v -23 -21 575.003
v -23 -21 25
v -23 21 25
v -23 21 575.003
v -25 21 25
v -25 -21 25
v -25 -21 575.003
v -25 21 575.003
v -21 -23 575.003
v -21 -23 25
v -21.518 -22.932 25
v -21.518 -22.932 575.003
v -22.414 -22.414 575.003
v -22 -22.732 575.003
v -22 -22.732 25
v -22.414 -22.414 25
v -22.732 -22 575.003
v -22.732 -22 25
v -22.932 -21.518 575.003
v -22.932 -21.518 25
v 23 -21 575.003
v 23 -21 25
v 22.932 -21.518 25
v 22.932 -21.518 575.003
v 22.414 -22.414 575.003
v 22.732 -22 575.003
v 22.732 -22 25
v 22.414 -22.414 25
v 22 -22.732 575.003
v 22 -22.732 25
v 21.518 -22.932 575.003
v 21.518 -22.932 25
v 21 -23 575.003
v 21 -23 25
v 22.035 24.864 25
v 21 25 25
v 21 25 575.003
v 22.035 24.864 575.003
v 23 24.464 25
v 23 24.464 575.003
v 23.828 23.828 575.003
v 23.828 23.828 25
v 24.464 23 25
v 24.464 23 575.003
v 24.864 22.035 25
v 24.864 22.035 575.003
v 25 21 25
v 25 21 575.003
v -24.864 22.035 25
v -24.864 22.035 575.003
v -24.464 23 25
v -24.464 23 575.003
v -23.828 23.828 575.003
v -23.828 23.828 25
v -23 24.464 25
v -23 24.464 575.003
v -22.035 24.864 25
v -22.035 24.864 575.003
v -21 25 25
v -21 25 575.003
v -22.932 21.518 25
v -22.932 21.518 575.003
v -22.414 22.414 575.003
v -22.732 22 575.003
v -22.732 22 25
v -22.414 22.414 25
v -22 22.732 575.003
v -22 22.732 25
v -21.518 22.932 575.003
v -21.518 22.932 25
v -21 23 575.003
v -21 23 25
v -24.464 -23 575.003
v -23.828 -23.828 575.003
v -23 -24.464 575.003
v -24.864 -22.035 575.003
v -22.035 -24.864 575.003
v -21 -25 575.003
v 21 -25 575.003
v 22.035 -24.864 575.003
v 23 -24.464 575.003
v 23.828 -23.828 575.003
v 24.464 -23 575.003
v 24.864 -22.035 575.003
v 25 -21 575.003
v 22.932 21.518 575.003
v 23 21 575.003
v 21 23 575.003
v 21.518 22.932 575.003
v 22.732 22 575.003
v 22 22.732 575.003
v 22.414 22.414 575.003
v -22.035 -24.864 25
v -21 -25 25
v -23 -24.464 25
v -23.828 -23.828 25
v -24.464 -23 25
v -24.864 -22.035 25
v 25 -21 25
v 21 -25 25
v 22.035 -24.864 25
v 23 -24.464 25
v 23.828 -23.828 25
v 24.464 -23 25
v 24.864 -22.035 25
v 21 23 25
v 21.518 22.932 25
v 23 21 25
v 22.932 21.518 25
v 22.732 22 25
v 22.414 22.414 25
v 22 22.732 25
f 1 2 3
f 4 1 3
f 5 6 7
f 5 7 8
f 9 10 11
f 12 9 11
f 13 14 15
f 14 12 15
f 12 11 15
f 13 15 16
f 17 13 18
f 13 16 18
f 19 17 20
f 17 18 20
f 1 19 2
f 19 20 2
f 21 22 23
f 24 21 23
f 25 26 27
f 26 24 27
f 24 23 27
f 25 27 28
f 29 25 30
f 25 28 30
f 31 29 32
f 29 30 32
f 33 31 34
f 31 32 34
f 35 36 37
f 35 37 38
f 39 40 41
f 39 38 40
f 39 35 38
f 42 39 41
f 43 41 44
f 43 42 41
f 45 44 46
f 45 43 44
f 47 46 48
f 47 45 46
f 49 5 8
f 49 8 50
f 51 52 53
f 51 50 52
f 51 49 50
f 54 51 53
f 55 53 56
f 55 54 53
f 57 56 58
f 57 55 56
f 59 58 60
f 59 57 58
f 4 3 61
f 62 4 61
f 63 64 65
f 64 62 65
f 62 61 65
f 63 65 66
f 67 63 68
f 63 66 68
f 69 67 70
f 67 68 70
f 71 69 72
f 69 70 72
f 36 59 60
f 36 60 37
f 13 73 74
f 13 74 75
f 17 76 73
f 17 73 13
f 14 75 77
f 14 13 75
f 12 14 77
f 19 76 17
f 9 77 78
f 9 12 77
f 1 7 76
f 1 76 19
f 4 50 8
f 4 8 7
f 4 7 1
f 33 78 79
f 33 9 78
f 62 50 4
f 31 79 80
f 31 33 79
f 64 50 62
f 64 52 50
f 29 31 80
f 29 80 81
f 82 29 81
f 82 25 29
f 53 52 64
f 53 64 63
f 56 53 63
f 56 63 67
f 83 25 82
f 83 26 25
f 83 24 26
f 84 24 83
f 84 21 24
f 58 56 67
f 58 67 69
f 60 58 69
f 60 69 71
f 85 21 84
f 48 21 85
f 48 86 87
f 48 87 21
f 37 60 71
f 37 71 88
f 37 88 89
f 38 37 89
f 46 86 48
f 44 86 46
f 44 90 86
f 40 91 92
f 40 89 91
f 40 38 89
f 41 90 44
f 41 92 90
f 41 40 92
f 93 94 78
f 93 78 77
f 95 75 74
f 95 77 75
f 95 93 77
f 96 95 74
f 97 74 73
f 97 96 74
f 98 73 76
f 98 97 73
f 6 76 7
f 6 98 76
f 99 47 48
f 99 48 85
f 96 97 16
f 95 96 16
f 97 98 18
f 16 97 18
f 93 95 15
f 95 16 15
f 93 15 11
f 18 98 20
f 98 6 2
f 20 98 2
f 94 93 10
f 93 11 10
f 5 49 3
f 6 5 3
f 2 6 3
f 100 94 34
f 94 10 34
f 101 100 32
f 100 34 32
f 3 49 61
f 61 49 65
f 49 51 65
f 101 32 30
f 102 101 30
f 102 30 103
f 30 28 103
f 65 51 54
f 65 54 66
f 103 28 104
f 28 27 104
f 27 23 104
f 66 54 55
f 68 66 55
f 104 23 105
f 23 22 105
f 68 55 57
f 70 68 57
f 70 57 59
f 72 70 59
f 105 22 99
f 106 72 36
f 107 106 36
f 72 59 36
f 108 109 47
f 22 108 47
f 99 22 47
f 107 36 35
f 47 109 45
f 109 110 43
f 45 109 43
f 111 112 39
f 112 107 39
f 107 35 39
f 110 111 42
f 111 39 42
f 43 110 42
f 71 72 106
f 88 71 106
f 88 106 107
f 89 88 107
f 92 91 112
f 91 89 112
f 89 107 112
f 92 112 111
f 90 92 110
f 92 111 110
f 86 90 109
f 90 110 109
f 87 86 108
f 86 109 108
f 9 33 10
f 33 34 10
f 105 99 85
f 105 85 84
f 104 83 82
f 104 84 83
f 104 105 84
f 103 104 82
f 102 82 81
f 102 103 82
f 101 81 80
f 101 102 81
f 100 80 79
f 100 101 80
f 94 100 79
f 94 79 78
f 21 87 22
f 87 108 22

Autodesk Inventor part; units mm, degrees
ref_plane "Start Plane" through (0, 0, 25) normal (0, 0, 1) x (1, 0, 0)
ref_plane "End Plane" through (0, 0, 575.0026) normal (0, 0, 1) x (1, 0, 0)
sketch "Sketch" plane through (0, 0, 0) normal (0, 0, 1) x (1, 0, 0)
  line L0 (-25, -21) -> (-25, 21)
  line L1 (-21, 25) -> (21, 25)
  line L2 (25, 21) -> (25, -21)
  line L3 (21, -25) -> (-21, -25)
  arc A0 (-25, -21) -> (-21, -25) centre (-21, -21) ccw
  arc A1 (25, 21) -> (21, 25) centre (21, 21) ccw
  arc A2 (-21, 25) -> (-25, 21) centre (-21, 21) ccw
  arc A3 (21, -25) -> (25, -21) centre (21, -21) ccw
  arc A4 (-21, 23) -> (-23, 21) centre (-21, 21) ccw
  line L4 (-21, 23) -> (21, 23)
  arc A5 (23, 21) -> (21, 23) centre (21, 21) ccw
  line L5 (23, 21) -> (23, -21)
  arc A6 (21, -23) -> (23, -21) centre (21, -21) ccw
  line L6 (21, -23) -> (-21, -23)
  arc A7 (-23, -21) -> (-21, -23) centre (-21, -21) ccw
  line L7 (-23, -21) -> (-23, 21)
  line L8 (0, 36.1598) -> (0, -36.1598) construction
  line L9 (-36.1598, 0) -> (36.1598, 0) construction
  dimension "d7" = 4
  dimension "d9" = 50
  dimension "d11" = 50
  dimension "d12" = 2
  dimension "d15" = 25
  dimension "d16" = 25
extrude "Body" add sketch "Sketch" along normal up to surface (550.0026 mm away) from surface at 25
sketch "Sketch3" plane through (0, 0, 0) normal (0, 0, 1) x (1, 0, 0)
  line L0 (0, 0) -> (10, 0)
ref_plane "Work Plane3" through (0, 0, 0) normal (0, -1, 0) x (1, 0, 0)
sketch "Sketch4" plane through (0, 0, 0) normal (0, -1, 0) x (1, 0, 0)
  line L0 (-2, 25) -> (12, 25)
  line L1 (-2, 575.0026) -> (12, 575.0026)
  dimension "d18" = 550.0026
ref_plane "Work Plane4" through (-1920, 21, 575.0026) normal (0, 0, 1) x (1, 0, 0)
split "Split1" plane through (-1920, 21, 575.0026) removes the side toward (0, 0, 1)
ref_plane "Work Plane5" through (392.5, 21, 25) normal (0, 0, -1) x (-1, 0, 0)
split "Split2" plane through (392.5, 21, 25) removes the side toward (0, 0, -1)
equation "\"d7\" = G_IR"
equation "\"d9\" = G_W"
equation "\"d11\" = G_H"
equation "\"d12\" = G_T"
equation "\"d15\" = 0.5 * d9"
equation "\"d16\" = 0.5 * d11"
equation "\"d3\" = G_L"
equation "\"G_W\" = 50"
equation "\"G_H\" = 50"
equation "\"G_T\" = 2"
equation "\"G_IR\" = 4"
equation "\"G_L\" = d18"
equation "\"G_OFFSET_START\" = -25"
equation "\"G_OFFSET_END\" = -25"
equation "\"d13\" = -G_OFFSET_START"
equation "\"d14\" = G_OFFSET_END + B_L"
equation "\"B_L\" = 600.0026"
properties part number "ISO 10799-2 - 50x50x2 - 550"
